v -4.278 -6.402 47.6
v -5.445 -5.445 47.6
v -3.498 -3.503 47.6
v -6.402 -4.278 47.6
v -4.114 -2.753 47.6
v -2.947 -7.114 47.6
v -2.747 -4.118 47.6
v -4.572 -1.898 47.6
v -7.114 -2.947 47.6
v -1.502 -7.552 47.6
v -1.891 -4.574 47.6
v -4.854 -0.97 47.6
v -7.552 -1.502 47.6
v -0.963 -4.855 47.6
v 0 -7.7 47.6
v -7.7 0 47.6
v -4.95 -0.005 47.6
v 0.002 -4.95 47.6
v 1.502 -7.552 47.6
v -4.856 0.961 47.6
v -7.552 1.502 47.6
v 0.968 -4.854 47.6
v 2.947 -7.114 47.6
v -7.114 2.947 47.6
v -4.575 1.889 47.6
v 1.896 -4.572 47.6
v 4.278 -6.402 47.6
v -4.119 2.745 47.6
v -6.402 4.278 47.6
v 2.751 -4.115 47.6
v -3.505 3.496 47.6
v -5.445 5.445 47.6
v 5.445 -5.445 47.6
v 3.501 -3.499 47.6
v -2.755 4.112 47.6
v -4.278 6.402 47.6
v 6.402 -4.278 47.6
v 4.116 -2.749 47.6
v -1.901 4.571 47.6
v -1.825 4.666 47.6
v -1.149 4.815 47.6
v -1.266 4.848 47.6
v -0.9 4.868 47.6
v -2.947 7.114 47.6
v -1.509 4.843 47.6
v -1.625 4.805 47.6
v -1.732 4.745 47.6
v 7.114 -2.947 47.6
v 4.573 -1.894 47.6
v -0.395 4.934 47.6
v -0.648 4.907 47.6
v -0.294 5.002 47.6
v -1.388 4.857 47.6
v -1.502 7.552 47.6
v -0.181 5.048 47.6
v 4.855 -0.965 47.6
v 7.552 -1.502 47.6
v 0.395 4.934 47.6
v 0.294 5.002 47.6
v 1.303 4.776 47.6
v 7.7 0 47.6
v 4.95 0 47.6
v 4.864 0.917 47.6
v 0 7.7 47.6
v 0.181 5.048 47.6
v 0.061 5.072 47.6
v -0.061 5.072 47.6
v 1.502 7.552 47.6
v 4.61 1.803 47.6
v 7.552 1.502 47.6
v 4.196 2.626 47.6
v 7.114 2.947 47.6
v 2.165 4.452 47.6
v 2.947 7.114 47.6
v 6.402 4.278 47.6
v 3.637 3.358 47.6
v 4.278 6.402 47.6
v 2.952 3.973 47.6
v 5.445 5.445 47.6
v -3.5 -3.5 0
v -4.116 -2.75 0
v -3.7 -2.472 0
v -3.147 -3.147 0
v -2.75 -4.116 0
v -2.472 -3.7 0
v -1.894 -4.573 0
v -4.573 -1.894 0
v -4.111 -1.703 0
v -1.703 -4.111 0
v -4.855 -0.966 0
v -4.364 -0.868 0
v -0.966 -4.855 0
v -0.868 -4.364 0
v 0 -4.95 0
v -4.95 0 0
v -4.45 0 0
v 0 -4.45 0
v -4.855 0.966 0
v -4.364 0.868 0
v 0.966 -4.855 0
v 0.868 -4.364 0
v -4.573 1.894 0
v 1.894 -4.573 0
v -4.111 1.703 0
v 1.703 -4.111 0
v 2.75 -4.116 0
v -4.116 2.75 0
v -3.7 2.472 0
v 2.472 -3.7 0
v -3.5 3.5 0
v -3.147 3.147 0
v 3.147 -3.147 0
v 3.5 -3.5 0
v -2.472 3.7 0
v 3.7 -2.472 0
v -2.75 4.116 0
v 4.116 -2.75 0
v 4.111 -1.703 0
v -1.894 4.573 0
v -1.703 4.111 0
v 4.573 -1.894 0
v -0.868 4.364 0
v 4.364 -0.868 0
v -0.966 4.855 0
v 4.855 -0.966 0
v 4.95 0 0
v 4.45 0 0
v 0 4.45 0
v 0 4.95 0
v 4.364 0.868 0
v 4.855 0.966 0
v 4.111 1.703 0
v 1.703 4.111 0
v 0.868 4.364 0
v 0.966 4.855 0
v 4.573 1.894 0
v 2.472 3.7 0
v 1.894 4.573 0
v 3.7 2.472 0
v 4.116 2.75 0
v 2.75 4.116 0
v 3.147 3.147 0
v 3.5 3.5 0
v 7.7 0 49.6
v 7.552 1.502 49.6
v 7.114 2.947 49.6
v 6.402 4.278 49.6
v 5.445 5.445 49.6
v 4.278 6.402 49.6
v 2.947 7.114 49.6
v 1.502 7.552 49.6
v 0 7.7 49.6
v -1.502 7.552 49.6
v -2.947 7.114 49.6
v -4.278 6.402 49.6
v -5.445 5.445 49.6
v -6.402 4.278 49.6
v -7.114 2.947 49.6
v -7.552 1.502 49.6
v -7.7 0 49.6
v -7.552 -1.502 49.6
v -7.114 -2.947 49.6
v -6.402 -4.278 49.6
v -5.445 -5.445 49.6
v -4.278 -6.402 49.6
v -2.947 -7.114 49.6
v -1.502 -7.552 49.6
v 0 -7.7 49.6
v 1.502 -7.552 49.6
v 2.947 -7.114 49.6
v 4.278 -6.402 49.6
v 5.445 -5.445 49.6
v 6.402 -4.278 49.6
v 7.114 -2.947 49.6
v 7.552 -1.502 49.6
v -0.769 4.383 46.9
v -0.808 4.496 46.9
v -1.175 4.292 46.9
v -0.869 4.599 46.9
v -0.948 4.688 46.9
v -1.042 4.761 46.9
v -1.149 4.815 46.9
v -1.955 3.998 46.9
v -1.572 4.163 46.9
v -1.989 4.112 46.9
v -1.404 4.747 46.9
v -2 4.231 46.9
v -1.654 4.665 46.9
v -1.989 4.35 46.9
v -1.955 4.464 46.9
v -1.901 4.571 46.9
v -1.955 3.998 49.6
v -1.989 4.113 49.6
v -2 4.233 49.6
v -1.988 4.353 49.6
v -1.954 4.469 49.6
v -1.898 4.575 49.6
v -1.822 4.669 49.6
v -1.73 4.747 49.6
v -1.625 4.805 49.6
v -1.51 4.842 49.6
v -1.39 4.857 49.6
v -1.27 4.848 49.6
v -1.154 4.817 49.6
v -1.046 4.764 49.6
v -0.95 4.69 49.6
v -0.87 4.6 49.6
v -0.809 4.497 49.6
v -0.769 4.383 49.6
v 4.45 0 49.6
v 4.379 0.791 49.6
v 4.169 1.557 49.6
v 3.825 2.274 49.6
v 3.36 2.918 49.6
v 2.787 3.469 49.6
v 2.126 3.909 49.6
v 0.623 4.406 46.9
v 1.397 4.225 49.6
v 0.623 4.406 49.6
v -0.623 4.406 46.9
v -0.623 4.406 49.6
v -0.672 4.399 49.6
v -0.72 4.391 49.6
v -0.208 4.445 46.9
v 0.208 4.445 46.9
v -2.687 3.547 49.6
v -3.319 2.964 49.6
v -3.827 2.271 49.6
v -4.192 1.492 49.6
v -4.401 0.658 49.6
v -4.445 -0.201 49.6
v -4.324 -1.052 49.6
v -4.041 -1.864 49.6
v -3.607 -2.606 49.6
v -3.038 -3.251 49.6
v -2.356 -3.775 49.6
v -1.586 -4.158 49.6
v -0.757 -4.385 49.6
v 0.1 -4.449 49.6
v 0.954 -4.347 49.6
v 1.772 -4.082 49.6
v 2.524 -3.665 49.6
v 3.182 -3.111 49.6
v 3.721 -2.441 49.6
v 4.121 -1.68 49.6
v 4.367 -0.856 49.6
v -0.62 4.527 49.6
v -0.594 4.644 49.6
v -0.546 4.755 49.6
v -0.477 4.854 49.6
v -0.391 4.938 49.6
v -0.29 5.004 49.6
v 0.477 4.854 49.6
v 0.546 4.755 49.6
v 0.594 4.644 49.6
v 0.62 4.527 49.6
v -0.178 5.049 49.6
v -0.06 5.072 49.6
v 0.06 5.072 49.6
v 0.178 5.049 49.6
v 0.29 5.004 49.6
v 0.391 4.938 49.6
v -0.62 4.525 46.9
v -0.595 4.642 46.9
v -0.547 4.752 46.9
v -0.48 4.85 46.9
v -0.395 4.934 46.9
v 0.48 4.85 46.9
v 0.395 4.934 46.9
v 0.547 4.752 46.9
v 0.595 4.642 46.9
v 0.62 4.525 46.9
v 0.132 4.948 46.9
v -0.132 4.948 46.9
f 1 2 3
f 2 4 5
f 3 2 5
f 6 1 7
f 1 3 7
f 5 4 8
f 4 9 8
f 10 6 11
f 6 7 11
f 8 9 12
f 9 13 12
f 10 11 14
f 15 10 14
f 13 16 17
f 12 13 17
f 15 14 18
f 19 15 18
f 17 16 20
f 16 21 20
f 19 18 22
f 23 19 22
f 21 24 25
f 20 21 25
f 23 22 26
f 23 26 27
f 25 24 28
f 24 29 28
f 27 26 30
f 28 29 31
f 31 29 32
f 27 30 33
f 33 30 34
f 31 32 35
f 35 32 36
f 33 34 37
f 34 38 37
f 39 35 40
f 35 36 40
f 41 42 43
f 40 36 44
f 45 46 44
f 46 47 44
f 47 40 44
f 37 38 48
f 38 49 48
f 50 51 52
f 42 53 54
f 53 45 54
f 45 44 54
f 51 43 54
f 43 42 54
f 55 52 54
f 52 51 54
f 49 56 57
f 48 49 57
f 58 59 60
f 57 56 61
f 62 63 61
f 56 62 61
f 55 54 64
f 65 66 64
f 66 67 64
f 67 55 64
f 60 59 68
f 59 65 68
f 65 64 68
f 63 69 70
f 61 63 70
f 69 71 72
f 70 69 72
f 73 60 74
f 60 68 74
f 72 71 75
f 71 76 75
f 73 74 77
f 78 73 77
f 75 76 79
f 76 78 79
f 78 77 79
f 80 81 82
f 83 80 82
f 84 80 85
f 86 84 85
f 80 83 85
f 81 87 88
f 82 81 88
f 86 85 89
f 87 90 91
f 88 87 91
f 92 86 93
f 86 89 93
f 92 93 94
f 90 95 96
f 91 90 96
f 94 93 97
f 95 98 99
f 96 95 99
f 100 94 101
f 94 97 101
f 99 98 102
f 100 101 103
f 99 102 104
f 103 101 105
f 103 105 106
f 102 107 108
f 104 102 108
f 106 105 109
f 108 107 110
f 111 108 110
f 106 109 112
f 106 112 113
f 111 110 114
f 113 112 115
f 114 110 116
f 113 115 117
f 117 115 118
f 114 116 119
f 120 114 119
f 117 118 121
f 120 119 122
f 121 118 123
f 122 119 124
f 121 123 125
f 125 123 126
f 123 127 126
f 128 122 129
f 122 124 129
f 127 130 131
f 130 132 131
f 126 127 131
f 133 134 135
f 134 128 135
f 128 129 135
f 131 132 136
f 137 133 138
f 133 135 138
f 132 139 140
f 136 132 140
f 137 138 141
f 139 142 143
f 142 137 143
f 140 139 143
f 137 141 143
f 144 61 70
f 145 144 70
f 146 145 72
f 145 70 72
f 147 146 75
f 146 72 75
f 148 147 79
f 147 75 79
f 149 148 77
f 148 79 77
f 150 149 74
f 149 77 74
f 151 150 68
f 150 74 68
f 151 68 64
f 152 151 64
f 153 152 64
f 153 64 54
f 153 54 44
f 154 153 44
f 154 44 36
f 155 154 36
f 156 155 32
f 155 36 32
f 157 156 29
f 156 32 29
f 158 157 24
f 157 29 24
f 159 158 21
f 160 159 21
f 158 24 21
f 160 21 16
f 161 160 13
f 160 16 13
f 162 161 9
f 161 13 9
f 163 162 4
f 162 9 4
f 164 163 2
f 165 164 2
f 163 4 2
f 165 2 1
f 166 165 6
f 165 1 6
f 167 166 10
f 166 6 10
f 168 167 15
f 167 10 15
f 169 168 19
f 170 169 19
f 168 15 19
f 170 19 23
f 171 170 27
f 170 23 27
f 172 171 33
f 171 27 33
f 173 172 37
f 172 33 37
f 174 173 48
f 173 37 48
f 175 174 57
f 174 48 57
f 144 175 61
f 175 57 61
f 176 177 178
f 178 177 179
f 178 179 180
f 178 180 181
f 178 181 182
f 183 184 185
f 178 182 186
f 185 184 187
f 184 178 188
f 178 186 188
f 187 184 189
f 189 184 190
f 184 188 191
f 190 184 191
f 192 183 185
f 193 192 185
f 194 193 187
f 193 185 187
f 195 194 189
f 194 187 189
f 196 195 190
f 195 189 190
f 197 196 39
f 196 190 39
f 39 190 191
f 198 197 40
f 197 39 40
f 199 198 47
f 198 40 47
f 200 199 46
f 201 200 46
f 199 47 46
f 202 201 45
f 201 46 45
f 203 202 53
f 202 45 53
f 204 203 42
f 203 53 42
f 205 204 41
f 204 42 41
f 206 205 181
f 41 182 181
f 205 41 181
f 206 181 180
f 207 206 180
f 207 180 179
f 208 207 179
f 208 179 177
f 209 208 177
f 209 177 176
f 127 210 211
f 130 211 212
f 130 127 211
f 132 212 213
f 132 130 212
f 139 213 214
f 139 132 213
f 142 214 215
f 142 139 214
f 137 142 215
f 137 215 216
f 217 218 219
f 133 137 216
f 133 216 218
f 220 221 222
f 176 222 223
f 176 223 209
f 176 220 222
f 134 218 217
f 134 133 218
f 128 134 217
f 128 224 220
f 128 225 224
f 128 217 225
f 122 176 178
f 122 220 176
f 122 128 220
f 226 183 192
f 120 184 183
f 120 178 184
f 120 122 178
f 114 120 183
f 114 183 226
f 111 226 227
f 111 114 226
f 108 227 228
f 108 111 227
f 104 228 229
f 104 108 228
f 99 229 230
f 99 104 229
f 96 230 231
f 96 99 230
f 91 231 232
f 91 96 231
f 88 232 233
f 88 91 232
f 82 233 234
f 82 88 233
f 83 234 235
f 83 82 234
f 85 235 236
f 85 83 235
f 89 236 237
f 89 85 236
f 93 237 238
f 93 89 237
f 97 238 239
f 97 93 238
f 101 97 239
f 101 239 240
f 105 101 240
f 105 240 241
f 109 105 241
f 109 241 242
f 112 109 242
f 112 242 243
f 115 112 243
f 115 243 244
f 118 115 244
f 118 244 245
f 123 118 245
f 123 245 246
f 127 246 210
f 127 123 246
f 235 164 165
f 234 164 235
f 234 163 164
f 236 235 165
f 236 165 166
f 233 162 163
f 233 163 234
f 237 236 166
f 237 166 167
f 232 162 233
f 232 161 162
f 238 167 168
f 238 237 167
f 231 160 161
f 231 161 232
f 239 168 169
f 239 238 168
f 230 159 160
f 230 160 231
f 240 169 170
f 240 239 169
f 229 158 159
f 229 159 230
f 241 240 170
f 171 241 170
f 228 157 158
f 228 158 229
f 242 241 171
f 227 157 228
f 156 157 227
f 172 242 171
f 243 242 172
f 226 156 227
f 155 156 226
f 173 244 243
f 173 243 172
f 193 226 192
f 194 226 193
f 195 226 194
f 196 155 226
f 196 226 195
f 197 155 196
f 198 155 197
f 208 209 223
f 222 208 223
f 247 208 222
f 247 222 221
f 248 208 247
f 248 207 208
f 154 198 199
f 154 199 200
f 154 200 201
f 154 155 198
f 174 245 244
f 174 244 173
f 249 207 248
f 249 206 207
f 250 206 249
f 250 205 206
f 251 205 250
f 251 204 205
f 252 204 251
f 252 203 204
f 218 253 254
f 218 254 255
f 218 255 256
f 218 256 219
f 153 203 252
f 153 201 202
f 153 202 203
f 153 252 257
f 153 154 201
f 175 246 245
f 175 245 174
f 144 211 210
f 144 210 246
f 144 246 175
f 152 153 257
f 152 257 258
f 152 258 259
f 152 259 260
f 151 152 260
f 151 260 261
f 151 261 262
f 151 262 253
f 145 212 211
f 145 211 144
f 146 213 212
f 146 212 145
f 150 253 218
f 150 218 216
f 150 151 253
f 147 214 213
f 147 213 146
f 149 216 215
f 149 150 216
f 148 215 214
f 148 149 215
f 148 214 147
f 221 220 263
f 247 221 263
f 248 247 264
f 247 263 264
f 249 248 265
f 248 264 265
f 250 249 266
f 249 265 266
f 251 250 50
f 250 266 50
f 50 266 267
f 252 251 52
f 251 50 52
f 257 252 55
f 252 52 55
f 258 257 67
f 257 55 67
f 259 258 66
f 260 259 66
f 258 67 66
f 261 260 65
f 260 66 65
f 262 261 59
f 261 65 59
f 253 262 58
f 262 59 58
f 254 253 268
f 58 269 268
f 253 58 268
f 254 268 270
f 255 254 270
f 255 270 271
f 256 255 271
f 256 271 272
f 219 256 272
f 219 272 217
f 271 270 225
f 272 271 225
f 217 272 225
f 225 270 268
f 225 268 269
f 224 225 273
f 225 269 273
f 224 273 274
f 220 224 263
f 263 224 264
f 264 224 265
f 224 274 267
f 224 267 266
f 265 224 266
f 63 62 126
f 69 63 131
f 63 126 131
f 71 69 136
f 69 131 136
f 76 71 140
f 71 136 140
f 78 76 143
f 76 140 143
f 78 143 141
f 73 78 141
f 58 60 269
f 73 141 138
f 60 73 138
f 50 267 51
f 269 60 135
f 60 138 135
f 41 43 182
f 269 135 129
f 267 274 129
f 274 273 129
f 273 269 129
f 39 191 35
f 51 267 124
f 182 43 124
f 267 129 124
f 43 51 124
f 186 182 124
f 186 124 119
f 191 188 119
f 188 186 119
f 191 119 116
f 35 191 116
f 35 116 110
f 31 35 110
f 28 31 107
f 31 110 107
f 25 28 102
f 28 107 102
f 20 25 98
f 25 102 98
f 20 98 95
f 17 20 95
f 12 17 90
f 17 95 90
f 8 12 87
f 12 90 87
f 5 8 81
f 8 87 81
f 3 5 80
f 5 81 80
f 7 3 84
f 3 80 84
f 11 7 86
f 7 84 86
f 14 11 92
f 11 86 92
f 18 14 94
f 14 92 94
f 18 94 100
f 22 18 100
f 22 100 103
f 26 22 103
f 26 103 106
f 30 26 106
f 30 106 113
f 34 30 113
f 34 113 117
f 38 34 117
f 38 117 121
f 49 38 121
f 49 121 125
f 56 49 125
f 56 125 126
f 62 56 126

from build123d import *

# Parameters (mm, degrees)
SKETCH1_R                      = 4.95
SKETCH1_R_2                    = 4.45
BOSS_EXTRUDE1_DEPTH            = 47.6
SKETCH5_R                      = 7.7
SKETCH5_R_2                    = 4.45
BOSS_EXTRUDE3_DEPTH            = 2
SKETCH2_R                      = 0.625
CUT_EXTRUDE1_DEPTH             = 0.7
CUT_EXTRUDE1_DIRECTION_2_REACH = 4


with BuildPart() as part:
    # Sketch1 → Boss-Extrude1 (new body)
    with BuildSketch(Plane.XY):
        Circle(SKETCH1_R)
        Circle(SKETCH1_R_2, mode=Mode.SUBTRACT)
    extrude(amount=BOSS_EXTRUDE1_DEPTH)

    # Sketch5 → Boss-Extrude3 (add)
    with BuildSketch(Plane.XY.offset(47.6)):
        Circle(SKETCH5_R)
        Circle(SKETCH5_R_2, mode=Mode.SUBTRACT)
    extrude(amount=BOSS_EXTRUDE3_DEPTH)

    # Sketch2 → Cut-Extrude1 (cut)
    with BuildSketch(Plane(origin=(0, 0, 47.6), x_dir=(-1, 0, 0), z_dir=(0, 0, -1))):
        with Locations((0, 4.45)):
            Circle(SKETCH2_R)
        with Locations((1.375125625, 4.232201498)):
            Circle(SKETCH2_R)
    extrude(amount=CUT_EXTRUDE1_DEPTH, mode=Mode.SUBTRACT)

    # Sketch2 → Cut-Extrude1 direction 2 (cut, up to next)
    with BuildSketch(Plane(origin=(0, 0, 47.6), x_dir=(-1, 0, 0), z_dir=(0, 0, -1)), mode=Mode.PRIVATE) as cut_extrude1_direction_2_sk1:
        with Locations((0, 4.45)):
            Circle(SKETCH2_R)
    cut_extrude1_direction_2_tool1 = extrude(cut_extrude1_direction_2_sk1.sketch, amount=-CUT_EXTRUDE1_DIRECTION_2_REACH, mode=Mode.PRIVATE) & part.part
    add(cut_extrude1_direction_2_tool1.solids().sort_by_distance((0, 4.45, 47.6))[0], mode=Mode.SUBTRACT)
    # Sketch2 → Cut-Extrude1 direction 2 (cut, up to next)
    with BuildSketch(Plane(origin=(0, 0, 47.6), x_dir=(-1, 0, 0), z_dir=(0, 0, -1)), mode=Mode.PRIVATE) as cut_extrude1_direction_2_sk2:
        with Locations((1.375125625, 4.232201498)):
            Circle(SKETCH2_R)
    cut_extrude1_direction_2_tool2 = extrude(cut_extrude1_direction_2_sk2.sketch, amount=-CUT_EXTRUDE1_DIRECTION_2_REACH, mode=Mode.PRIVATE) & part.part
    add(cut_extrude1_direction_2_tool2.solids().sort_by_distance((-1.375126, 4.232201, 47.6))[0], mode=Mode.SUBTRACT)


solid = part.part
